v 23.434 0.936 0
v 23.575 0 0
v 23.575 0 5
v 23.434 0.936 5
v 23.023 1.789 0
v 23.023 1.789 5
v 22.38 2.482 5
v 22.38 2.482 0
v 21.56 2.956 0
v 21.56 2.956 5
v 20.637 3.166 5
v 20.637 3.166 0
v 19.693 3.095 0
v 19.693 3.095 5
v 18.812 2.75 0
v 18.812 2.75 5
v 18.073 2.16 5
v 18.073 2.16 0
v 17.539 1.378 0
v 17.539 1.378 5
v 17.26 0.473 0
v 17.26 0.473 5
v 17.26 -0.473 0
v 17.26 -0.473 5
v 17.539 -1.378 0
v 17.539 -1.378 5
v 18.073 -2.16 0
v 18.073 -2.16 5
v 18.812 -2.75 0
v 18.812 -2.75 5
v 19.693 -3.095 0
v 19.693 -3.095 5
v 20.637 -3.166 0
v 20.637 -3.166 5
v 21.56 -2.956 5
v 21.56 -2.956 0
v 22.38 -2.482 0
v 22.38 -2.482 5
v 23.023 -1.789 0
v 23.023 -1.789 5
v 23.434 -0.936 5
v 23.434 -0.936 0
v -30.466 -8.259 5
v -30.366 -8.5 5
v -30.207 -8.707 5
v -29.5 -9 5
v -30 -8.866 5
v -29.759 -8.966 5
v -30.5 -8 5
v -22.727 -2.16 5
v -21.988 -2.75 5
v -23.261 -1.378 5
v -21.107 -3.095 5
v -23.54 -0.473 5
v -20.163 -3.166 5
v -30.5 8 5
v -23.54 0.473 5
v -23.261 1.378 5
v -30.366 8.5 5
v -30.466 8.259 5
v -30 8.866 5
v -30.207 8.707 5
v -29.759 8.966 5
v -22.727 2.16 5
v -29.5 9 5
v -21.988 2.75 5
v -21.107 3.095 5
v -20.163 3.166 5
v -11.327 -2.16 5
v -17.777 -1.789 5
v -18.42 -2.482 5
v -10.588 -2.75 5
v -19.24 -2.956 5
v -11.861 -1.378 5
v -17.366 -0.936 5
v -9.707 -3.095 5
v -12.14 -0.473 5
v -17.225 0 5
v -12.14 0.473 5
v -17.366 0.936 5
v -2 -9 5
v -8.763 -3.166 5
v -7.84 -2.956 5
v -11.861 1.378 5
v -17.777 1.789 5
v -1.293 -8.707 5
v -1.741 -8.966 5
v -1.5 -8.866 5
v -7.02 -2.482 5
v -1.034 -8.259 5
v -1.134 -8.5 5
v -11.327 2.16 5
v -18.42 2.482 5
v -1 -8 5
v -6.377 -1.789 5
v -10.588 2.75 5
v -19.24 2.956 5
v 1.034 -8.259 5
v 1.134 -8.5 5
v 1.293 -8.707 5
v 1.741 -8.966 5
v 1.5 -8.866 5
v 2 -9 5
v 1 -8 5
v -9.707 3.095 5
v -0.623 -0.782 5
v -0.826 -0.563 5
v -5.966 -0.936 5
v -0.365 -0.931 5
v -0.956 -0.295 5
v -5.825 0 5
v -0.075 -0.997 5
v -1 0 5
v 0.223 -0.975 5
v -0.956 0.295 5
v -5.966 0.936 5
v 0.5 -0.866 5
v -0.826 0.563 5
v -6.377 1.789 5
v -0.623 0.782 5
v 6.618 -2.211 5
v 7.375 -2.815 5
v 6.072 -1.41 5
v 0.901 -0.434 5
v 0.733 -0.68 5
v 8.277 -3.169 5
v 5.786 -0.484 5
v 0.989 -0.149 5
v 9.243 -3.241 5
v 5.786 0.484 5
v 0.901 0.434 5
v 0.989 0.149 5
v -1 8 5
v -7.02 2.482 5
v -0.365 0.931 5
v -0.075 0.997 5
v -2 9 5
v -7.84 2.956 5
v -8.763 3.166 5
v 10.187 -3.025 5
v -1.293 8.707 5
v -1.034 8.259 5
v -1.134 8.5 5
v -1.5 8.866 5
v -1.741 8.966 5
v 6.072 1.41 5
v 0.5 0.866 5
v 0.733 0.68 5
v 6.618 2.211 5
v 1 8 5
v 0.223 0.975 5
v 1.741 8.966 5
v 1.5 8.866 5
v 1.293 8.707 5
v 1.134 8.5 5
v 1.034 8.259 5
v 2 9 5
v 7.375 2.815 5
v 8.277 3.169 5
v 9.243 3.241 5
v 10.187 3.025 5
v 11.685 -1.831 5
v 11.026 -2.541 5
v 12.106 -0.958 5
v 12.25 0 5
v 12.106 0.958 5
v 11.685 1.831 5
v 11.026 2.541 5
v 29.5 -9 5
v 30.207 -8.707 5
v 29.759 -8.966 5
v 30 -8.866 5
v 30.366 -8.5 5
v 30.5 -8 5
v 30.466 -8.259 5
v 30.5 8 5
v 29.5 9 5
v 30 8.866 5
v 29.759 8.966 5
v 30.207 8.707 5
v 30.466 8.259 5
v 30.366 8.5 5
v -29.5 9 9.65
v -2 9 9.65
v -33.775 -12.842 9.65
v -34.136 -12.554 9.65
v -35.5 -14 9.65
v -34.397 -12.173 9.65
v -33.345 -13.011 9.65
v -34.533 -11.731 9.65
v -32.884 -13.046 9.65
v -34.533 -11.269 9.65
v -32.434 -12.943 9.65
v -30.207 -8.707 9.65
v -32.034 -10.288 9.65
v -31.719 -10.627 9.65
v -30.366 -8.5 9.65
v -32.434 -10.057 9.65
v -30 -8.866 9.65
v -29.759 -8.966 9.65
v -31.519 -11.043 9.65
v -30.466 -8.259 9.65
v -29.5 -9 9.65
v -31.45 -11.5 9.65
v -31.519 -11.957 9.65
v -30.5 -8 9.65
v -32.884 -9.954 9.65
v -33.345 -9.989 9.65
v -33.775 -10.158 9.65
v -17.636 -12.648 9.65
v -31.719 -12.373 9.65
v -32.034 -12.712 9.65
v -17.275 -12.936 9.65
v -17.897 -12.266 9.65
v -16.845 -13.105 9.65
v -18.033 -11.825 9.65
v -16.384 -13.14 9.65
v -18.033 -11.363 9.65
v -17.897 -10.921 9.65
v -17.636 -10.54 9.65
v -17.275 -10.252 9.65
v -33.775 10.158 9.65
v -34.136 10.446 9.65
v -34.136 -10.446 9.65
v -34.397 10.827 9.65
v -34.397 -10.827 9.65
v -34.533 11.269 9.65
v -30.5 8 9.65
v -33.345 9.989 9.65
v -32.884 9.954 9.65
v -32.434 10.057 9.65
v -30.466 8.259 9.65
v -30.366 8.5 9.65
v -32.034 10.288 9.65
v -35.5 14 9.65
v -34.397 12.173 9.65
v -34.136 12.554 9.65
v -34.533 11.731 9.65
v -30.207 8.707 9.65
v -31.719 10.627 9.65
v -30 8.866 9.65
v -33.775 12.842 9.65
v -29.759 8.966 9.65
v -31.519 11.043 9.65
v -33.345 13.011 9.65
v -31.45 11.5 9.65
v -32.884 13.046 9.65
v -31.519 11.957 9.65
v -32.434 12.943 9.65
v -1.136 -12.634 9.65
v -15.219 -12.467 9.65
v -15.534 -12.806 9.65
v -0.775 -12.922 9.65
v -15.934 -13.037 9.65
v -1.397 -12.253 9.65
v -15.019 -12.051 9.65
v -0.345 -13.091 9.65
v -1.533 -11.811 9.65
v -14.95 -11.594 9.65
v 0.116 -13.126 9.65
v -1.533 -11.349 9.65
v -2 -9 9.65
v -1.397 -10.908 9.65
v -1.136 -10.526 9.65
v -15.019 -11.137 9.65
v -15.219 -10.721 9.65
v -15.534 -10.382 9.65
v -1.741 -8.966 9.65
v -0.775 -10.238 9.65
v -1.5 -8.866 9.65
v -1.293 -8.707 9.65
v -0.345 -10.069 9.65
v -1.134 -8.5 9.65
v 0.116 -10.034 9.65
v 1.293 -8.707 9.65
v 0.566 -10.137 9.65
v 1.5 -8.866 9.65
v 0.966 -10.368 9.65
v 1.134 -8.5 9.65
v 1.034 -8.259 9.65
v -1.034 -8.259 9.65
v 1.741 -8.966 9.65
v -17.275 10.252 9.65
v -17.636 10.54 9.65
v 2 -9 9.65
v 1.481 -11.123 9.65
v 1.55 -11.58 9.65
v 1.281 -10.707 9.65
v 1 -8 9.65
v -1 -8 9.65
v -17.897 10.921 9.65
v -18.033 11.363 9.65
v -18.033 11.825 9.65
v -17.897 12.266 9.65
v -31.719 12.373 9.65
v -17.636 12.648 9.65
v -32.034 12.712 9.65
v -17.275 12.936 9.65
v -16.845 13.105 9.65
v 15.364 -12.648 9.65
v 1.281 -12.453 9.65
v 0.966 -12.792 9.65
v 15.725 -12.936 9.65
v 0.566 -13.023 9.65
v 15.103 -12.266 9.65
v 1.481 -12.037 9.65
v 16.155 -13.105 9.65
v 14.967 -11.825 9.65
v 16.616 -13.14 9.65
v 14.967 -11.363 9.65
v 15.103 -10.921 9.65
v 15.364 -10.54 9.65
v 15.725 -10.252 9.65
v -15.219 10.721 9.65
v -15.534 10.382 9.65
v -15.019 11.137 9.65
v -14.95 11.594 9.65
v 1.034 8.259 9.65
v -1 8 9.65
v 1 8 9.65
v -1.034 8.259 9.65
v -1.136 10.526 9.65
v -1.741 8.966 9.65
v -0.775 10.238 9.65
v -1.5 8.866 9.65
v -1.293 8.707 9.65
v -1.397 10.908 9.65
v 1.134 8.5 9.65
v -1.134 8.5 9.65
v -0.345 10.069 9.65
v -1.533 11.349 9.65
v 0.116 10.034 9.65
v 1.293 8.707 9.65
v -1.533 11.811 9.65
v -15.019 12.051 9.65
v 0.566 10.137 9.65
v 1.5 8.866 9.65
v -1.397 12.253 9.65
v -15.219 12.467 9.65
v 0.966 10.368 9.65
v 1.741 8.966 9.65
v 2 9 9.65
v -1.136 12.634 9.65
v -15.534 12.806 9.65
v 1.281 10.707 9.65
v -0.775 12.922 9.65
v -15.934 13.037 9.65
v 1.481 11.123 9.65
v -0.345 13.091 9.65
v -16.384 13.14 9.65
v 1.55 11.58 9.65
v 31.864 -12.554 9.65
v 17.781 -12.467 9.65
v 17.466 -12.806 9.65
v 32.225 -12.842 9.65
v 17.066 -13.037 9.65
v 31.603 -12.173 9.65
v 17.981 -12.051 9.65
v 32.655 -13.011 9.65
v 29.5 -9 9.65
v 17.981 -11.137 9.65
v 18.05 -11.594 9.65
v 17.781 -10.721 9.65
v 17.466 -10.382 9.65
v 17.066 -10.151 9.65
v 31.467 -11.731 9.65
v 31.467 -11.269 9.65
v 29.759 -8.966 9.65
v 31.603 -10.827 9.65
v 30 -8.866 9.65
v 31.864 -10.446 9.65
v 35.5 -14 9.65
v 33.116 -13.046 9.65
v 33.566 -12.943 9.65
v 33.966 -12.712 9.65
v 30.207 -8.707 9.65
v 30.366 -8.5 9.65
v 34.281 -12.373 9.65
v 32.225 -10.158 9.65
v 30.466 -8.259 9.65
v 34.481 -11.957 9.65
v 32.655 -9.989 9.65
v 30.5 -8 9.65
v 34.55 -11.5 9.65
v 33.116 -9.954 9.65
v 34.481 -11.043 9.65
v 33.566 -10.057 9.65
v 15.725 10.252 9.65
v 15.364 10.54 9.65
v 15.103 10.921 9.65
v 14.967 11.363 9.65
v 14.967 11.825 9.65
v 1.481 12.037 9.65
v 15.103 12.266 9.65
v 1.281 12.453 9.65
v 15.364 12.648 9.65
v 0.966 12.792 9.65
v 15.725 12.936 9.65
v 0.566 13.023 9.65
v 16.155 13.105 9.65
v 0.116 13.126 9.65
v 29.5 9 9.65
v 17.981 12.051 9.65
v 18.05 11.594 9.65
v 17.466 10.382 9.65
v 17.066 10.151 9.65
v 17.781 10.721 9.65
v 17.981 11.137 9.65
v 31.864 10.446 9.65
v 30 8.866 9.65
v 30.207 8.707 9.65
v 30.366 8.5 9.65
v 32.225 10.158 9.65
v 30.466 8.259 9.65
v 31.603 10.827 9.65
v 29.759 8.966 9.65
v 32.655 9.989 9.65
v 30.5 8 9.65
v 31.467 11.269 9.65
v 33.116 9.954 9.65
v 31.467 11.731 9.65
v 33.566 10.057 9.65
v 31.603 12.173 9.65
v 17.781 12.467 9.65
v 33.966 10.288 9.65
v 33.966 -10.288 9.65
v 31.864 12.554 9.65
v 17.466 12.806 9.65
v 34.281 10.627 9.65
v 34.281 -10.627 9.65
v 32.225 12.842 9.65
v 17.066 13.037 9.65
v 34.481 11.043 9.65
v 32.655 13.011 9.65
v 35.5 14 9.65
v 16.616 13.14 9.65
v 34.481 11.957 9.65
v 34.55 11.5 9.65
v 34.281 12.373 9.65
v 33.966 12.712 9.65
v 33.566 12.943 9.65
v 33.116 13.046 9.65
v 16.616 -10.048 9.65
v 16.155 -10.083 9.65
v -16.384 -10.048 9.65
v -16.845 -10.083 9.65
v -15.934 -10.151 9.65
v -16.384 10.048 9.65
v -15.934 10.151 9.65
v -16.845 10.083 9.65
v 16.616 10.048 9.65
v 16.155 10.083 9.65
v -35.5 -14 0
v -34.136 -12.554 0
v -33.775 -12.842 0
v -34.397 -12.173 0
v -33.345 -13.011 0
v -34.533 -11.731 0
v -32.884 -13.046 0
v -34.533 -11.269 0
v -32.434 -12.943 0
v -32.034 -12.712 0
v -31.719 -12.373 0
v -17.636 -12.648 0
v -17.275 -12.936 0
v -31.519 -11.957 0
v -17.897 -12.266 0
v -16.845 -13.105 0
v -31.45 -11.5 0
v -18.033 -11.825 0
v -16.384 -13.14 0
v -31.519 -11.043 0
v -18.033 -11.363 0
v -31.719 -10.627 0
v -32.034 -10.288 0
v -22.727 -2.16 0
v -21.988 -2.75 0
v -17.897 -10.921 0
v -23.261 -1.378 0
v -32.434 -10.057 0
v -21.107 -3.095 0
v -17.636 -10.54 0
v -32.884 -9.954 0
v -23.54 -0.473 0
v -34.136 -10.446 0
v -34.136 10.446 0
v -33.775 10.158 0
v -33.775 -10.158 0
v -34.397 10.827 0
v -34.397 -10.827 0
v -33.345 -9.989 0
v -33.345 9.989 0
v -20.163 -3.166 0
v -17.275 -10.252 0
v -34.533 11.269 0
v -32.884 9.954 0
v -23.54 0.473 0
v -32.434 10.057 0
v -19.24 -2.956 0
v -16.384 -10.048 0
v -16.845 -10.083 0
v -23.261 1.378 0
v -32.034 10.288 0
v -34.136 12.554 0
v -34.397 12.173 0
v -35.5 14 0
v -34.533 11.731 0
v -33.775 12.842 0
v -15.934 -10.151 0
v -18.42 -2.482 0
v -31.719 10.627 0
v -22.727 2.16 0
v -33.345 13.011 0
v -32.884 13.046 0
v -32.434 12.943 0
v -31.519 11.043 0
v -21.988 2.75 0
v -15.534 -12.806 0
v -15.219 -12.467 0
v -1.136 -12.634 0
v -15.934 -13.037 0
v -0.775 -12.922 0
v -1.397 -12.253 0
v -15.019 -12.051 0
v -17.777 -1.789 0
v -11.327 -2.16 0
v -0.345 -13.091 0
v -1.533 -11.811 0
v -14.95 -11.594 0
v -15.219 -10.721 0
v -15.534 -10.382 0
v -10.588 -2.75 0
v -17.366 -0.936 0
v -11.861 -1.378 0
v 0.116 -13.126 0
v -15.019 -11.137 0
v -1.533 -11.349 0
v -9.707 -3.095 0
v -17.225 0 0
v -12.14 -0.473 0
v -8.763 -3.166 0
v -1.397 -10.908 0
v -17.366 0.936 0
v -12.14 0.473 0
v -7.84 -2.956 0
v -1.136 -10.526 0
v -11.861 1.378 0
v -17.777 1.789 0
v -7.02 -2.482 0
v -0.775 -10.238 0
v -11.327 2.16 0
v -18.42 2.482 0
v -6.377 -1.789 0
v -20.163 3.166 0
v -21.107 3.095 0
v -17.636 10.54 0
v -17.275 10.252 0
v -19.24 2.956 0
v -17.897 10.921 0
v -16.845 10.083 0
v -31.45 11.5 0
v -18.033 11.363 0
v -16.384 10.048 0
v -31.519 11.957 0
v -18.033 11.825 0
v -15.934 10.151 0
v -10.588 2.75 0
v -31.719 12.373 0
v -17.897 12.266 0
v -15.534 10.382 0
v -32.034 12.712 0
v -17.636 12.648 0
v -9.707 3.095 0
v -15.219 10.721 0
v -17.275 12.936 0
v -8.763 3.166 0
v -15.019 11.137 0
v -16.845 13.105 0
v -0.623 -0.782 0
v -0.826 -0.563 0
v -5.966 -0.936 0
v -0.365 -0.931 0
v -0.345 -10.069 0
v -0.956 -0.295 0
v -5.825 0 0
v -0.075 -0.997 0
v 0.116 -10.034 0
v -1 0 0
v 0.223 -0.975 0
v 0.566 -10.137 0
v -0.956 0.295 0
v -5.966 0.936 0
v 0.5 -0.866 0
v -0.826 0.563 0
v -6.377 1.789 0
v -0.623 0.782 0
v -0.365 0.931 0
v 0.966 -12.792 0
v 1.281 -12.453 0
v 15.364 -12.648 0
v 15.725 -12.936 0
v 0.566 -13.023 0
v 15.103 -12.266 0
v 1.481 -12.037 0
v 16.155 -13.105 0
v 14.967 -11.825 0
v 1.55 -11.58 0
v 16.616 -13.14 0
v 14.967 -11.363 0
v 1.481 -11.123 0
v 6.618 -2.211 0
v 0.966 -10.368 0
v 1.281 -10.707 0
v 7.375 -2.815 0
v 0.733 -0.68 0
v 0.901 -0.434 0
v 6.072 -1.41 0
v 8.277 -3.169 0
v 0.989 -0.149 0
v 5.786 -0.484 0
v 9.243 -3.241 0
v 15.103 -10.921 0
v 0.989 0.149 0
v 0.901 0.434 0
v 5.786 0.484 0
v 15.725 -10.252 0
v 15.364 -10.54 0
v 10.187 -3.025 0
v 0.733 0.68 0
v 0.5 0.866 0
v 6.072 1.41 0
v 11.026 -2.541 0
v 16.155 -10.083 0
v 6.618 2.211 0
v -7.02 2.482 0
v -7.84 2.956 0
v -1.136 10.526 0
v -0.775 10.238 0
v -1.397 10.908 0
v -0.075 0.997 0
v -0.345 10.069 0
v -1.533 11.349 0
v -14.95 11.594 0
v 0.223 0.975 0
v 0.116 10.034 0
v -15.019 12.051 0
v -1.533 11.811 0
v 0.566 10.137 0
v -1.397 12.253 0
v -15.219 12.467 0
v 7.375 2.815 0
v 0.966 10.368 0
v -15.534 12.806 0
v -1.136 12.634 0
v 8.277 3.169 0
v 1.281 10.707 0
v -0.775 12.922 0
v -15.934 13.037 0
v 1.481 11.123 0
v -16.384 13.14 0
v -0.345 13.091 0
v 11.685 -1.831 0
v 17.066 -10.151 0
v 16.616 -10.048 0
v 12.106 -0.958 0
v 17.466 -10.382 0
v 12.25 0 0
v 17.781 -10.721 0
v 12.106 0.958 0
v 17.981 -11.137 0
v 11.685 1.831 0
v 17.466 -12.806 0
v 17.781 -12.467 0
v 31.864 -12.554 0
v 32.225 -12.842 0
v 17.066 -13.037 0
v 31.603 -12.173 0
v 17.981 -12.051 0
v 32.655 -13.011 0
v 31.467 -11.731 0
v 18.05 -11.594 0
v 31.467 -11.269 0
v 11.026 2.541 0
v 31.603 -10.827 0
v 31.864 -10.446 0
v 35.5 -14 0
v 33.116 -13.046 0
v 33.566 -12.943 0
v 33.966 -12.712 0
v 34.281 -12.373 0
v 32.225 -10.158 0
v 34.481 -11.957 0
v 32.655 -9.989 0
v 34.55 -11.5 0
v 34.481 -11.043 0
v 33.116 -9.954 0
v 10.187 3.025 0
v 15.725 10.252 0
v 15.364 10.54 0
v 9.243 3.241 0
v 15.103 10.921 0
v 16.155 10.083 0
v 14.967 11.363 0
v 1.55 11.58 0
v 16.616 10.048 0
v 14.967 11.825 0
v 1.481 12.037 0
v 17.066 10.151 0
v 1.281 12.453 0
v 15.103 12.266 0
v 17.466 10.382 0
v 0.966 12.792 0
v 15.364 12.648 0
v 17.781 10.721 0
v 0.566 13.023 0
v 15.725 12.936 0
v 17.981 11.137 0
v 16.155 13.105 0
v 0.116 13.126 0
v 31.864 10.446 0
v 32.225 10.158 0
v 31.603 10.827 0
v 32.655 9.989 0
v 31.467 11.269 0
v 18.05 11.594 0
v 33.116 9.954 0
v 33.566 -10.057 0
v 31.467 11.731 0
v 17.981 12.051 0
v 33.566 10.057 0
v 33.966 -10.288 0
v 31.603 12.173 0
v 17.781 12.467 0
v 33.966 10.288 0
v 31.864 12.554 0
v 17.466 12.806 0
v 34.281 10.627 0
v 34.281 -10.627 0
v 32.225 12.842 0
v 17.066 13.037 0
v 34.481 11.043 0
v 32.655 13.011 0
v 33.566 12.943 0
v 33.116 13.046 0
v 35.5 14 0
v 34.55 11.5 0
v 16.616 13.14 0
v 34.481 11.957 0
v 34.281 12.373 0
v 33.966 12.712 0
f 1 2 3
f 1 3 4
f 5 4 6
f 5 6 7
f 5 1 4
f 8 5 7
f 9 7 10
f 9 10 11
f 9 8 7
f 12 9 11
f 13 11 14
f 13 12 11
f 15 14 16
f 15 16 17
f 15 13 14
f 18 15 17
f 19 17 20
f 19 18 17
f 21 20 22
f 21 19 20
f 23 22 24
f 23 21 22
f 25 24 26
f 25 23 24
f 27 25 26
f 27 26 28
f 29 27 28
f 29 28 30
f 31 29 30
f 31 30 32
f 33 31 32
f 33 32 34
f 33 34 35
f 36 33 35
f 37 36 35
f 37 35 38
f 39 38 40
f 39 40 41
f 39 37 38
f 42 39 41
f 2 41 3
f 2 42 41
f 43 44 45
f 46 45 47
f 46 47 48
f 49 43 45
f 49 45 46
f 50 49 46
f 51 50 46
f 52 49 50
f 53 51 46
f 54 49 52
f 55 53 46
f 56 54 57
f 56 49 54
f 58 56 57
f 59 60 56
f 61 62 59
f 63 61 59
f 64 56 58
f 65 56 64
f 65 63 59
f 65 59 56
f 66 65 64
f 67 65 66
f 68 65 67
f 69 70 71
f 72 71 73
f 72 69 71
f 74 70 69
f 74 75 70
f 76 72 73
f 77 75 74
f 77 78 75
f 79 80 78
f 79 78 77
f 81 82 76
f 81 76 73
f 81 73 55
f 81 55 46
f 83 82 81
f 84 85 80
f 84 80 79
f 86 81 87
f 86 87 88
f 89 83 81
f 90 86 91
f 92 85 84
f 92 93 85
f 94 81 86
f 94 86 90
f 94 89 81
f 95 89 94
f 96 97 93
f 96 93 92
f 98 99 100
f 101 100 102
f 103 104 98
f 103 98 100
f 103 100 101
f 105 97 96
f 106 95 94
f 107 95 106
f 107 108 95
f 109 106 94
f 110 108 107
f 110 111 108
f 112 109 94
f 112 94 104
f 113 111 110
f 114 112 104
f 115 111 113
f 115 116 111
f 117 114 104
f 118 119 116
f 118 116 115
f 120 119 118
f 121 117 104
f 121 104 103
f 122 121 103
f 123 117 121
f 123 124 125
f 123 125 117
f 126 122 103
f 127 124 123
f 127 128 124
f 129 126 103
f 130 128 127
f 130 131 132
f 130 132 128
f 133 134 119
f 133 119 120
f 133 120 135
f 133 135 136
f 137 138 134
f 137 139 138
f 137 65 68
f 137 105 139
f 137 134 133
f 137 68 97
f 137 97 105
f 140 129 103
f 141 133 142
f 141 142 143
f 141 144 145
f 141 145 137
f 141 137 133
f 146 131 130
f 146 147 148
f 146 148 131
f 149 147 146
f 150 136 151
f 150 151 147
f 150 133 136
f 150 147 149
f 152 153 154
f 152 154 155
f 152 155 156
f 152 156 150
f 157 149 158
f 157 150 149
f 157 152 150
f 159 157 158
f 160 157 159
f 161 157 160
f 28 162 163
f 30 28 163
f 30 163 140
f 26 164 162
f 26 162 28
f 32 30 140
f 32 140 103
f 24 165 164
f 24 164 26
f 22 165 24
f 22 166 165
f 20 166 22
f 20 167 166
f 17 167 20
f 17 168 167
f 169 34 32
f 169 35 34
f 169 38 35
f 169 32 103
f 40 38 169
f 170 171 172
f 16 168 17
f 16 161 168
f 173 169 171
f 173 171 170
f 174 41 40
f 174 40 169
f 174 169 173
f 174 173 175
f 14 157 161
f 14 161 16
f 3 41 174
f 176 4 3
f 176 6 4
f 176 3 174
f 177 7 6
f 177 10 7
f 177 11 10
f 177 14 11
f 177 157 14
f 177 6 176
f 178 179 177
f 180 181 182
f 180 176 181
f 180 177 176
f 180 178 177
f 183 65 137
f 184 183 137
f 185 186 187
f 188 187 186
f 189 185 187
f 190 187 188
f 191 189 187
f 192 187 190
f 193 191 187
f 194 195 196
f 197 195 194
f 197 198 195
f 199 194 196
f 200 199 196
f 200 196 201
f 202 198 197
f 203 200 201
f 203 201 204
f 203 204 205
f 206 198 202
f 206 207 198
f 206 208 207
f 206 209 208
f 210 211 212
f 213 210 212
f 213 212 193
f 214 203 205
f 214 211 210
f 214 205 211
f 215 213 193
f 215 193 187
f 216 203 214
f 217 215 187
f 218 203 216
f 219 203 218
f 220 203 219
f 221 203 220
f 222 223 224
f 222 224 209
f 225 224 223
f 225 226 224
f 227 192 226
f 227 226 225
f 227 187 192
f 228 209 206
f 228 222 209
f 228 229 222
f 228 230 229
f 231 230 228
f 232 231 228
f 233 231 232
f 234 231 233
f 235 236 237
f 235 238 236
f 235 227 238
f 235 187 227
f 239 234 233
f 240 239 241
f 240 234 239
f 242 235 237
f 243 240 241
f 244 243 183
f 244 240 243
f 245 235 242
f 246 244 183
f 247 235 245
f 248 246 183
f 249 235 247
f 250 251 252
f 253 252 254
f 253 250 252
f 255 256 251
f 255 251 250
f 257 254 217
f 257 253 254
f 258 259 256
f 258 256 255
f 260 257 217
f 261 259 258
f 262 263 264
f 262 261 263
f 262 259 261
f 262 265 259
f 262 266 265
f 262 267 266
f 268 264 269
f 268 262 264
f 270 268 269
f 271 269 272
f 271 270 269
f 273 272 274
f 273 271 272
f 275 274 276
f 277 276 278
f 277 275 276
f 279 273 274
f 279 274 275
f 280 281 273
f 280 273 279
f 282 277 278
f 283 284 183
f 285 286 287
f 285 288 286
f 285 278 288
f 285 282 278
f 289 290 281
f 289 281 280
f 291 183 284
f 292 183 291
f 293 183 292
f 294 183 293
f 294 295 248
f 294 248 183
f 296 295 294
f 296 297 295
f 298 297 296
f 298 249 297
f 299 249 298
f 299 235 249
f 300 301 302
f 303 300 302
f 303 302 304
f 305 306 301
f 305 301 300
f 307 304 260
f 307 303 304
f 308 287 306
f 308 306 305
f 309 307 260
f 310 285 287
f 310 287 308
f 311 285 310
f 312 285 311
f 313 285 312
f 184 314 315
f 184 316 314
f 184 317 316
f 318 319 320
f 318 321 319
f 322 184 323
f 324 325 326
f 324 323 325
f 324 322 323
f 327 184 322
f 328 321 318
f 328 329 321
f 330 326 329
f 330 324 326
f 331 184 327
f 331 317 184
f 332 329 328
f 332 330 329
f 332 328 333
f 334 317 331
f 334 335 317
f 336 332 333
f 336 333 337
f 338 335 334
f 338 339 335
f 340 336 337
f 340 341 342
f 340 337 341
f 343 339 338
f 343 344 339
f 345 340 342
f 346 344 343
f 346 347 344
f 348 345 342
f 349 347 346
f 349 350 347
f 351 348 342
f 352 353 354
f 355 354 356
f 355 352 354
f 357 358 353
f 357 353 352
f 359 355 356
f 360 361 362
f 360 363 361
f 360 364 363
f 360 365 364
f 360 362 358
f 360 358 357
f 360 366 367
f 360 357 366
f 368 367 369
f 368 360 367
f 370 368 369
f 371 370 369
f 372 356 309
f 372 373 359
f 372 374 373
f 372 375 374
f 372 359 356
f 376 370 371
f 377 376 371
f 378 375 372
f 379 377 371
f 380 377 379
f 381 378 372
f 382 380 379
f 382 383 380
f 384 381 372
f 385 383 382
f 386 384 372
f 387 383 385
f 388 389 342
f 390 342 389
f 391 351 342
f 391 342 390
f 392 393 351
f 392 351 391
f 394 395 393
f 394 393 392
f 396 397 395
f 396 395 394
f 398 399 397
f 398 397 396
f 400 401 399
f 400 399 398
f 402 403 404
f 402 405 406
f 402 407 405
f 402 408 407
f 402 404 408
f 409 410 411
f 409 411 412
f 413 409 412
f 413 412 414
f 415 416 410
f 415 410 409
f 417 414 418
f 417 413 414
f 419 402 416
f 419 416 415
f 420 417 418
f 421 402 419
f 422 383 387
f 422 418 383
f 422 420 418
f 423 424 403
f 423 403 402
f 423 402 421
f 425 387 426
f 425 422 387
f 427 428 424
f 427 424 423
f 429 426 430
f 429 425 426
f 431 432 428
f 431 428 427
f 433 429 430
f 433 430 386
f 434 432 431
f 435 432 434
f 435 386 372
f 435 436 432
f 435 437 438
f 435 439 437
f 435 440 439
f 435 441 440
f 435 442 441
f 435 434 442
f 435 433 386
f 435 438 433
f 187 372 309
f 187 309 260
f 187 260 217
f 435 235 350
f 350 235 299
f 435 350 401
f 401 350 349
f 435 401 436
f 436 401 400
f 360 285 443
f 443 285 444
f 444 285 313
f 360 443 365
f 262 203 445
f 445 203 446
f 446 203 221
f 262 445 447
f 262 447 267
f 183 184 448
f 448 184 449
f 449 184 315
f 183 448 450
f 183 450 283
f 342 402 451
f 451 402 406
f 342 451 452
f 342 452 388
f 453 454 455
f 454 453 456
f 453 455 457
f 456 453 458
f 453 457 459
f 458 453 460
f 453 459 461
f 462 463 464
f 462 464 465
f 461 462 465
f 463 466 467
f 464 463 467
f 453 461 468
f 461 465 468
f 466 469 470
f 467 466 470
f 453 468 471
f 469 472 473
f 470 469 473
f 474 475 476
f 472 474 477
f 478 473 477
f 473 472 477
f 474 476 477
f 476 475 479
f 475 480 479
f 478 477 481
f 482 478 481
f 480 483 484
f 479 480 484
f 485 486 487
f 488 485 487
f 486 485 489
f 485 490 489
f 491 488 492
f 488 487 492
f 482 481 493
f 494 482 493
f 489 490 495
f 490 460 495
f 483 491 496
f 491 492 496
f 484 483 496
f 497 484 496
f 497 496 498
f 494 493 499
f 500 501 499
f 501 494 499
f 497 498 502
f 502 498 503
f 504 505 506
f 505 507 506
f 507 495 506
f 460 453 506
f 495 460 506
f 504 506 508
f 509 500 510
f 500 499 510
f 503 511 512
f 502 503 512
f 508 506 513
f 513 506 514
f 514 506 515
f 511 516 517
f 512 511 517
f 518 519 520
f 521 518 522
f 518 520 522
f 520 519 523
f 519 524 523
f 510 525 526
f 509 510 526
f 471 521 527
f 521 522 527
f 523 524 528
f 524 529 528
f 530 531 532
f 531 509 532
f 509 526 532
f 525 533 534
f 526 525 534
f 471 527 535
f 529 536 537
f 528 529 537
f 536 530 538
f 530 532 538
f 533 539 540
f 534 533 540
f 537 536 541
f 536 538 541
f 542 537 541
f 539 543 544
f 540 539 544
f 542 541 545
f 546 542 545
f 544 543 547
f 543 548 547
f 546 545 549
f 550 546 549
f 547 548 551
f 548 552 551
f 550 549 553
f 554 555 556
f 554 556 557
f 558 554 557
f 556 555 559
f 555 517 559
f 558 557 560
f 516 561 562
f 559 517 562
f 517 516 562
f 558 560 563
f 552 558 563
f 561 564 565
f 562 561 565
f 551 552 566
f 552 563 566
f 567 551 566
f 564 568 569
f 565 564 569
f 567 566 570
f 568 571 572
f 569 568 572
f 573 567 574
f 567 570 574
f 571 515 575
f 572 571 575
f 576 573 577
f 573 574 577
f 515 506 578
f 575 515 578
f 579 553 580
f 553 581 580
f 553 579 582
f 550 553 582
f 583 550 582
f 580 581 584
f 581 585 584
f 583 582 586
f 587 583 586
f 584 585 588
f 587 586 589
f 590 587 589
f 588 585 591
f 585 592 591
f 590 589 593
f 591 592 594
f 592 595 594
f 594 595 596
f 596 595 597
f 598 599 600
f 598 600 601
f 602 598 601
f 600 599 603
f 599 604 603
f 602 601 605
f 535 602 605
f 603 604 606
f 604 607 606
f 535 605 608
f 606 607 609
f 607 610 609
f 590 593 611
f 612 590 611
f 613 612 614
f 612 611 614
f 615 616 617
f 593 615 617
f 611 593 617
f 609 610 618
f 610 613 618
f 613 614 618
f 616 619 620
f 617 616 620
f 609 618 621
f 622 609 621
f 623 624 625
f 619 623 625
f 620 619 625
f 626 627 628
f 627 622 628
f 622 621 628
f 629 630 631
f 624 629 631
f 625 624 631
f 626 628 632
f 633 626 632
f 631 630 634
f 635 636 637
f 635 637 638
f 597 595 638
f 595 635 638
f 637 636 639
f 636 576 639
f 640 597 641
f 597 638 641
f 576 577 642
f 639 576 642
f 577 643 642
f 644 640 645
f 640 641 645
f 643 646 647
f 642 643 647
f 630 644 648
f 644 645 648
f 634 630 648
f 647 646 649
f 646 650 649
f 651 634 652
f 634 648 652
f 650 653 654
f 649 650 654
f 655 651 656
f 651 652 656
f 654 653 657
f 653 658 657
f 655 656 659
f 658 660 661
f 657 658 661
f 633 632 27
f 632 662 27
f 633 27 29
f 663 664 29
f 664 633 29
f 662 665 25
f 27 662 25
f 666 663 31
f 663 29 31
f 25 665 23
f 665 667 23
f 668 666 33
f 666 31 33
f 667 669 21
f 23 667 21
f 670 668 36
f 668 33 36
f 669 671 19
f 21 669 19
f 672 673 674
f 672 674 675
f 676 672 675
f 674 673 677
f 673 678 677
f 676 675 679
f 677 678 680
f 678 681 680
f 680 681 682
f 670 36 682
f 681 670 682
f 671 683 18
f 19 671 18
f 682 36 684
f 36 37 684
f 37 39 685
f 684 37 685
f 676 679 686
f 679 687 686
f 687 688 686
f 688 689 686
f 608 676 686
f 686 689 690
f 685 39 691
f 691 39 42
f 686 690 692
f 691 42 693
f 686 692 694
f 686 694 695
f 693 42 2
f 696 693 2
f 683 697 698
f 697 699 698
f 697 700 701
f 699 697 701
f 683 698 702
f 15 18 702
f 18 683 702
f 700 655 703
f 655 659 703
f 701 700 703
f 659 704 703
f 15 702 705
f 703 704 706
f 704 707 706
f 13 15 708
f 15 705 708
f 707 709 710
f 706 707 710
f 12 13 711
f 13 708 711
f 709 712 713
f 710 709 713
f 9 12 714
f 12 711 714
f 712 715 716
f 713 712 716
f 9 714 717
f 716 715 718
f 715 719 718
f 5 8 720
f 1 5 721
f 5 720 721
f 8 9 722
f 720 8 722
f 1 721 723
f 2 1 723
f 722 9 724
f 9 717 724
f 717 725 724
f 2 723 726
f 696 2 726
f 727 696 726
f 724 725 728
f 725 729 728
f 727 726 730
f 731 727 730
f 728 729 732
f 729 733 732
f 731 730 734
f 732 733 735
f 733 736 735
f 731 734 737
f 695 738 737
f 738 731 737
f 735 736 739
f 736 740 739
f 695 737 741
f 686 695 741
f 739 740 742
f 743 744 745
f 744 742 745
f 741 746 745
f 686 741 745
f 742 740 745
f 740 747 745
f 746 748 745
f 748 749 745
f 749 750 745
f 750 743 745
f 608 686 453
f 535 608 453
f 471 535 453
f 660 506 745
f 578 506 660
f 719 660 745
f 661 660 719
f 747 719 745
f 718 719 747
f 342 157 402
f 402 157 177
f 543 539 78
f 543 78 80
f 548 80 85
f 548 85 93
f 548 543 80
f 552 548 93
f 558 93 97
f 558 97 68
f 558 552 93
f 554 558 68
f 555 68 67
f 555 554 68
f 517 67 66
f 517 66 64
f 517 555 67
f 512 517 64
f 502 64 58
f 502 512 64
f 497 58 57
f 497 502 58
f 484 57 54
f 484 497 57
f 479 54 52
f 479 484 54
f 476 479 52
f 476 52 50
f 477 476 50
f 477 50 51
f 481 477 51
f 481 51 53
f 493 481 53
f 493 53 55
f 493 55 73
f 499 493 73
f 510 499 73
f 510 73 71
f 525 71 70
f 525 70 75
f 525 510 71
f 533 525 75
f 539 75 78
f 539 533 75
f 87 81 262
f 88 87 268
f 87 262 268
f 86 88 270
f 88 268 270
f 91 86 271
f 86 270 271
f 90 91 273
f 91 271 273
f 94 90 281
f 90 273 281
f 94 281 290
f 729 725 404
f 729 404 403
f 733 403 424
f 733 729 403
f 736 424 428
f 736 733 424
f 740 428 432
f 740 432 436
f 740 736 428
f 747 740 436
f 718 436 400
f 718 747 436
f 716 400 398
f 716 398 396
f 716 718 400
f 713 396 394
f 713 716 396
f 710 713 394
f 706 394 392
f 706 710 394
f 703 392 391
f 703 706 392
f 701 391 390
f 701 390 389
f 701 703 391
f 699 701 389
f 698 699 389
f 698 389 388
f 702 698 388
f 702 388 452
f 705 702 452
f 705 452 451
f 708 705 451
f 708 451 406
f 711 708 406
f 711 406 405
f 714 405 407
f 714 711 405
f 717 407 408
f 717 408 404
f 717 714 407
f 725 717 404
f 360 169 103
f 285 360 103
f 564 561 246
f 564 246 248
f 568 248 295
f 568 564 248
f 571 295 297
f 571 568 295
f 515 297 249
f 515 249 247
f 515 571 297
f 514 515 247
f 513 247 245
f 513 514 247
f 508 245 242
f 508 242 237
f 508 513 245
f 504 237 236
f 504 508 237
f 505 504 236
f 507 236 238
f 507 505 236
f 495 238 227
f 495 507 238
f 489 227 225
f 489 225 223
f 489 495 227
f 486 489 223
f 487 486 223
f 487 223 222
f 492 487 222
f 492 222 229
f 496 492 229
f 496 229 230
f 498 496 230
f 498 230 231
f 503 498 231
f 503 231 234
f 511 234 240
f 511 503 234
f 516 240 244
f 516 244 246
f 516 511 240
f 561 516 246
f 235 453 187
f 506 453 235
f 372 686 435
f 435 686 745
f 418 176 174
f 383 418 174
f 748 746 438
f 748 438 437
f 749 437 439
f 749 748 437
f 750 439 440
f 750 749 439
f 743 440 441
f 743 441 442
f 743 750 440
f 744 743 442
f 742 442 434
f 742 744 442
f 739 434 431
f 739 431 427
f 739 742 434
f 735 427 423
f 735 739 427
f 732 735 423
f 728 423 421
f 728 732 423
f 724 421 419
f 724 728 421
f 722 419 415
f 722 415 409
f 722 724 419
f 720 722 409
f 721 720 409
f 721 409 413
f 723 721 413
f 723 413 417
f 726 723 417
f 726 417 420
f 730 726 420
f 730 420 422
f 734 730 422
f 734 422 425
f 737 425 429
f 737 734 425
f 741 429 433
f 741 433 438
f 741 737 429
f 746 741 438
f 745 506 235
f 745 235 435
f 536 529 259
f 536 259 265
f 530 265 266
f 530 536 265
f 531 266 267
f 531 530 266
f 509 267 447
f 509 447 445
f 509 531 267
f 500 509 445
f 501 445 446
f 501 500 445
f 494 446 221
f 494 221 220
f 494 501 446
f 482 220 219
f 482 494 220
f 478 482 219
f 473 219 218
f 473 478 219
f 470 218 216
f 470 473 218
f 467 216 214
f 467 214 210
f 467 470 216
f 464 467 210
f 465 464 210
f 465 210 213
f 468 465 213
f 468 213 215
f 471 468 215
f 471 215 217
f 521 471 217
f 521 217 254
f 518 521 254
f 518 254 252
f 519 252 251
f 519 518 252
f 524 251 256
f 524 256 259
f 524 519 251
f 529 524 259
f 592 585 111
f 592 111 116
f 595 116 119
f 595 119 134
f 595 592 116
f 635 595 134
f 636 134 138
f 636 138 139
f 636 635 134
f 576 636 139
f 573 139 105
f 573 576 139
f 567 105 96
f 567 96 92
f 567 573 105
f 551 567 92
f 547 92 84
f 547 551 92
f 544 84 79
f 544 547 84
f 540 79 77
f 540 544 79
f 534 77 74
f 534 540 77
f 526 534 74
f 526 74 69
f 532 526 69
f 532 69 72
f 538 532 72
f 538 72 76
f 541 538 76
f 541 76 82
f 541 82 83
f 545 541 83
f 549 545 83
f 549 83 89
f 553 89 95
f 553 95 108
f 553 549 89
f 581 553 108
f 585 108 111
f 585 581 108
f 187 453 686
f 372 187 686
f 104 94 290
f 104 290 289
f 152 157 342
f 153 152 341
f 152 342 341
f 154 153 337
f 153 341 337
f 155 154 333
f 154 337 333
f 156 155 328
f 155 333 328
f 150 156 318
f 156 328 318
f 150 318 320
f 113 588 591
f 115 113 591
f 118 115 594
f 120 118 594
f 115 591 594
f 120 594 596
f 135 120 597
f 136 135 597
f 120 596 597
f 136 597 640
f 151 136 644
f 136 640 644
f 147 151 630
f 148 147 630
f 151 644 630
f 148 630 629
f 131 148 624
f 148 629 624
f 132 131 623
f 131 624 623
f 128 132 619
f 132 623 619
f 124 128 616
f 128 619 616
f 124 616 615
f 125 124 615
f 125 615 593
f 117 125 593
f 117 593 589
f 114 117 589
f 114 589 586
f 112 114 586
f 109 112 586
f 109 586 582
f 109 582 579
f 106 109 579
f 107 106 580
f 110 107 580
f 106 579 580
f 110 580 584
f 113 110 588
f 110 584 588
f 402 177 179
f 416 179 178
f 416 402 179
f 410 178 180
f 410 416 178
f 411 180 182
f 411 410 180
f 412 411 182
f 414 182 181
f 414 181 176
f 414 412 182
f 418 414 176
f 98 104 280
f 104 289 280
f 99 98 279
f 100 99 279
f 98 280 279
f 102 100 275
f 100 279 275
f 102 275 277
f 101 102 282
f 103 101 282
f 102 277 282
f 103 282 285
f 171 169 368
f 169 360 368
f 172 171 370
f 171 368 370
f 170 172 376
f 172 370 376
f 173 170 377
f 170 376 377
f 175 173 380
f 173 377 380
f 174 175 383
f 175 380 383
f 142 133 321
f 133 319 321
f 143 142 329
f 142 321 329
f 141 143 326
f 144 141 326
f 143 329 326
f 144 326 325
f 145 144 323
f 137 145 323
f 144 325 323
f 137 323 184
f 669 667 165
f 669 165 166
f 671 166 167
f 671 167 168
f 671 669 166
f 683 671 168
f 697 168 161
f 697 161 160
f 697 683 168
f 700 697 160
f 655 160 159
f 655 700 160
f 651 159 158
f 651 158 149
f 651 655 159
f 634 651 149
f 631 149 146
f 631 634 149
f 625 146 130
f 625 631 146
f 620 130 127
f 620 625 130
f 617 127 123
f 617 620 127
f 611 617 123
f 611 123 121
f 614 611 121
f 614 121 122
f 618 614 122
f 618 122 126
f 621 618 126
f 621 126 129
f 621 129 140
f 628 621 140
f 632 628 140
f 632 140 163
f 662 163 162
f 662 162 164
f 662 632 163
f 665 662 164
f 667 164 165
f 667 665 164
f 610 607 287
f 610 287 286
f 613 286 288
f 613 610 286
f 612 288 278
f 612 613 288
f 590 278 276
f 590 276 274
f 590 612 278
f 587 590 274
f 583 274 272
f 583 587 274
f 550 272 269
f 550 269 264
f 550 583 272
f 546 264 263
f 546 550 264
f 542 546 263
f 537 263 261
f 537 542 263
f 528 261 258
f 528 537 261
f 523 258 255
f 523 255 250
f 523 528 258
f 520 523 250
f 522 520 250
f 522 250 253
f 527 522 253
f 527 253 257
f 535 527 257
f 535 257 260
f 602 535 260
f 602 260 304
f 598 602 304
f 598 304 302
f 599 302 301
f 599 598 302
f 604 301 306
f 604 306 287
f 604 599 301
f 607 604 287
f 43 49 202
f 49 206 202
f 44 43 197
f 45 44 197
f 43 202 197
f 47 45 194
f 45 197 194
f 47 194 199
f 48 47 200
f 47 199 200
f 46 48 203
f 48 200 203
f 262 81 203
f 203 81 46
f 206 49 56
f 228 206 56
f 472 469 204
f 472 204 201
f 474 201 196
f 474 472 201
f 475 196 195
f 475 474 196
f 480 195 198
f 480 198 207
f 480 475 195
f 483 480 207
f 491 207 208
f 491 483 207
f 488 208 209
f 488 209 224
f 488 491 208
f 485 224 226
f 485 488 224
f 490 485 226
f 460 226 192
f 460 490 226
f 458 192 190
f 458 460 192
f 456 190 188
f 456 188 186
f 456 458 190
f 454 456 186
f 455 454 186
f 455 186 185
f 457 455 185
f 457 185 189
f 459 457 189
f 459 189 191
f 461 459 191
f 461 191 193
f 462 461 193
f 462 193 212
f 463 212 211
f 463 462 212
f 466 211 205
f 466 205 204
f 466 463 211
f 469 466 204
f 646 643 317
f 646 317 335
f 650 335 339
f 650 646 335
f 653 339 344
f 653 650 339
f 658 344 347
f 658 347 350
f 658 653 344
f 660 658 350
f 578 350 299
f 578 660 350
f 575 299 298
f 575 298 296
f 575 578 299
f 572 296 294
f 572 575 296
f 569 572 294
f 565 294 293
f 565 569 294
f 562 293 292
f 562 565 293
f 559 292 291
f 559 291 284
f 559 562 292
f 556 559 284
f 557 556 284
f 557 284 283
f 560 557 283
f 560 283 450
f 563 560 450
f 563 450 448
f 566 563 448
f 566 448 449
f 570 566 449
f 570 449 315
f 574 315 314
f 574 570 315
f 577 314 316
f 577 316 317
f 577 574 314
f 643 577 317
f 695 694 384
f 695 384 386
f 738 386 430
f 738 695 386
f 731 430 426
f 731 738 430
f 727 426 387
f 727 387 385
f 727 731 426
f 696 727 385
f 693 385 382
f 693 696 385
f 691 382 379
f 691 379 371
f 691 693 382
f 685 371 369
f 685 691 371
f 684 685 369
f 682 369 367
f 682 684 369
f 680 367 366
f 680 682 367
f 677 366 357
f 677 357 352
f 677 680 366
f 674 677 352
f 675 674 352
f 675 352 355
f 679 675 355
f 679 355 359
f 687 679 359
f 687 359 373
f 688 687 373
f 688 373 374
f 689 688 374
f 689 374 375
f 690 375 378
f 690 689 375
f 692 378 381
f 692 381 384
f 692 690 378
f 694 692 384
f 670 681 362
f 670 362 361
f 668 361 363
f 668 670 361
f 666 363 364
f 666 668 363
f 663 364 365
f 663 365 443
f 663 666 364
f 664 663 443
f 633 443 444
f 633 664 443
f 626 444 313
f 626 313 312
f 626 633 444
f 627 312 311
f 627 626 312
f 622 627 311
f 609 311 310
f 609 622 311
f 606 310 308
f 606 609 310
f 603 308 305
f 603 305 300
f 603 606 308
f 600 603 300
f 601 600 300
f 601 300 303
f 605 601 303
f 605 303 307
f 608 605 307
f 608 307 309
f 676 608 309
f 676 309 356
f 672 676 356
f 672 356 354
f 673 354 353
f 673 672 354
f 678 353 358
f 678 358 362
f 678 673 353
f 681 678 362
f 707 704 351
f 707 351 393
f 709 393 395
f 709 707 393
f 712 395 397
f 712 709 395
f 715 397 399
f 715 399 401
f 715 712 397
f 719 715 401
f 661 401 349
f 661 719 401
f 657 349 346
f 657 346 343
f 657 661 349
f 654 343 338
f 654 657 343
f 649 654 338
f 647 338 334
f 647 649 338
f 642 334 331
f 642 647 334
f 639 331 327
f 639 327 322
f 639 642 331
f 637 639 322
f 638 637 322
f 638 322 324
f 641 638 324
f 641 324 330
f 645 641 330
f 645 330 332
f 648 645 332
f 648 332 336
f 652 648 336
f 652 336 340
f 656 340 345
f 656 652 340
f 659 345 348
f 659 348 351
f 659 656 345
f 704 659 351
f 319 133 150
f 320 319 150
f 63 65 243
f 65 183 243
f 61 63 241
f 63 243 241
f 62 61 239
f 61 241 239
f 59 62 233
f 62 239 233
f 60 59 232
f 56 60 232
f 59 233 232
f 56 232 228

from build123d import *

# Parameters (mm, degrees)
F0_W     = 71
F0_H     = 28
F0_R     = 1.55
F0_W_2   = 2
F0_H_2   = 1
F1_DEPTH = 9.65
F0_R_2   = 3.25
F0_R_3   = 3.175
F2_DEPTH = 5
F3_R     = 0.99999


# Not quite as in the source:
# - a fillet or chamfer is up to 0.001 mm smaller than in the source, because OpenCascade refuses the exact size


with BuildPart() as f1:
    # F0 (on Top) → F1 (new body)
    with BuildSketch(Plane.XY):
        Rectangle(F0_W, F0_H)
        with Locations((-33, -11.5)):
            Circle(F0_R, mode=Mode.SUBTRACT)
        with Locations((-16.5, -11.5939453244)):
            Circle(F0_R, mode=Mode.SUBTRACT)
        with Locations((0, -11.5801189095)):
            Circle(F0_R, mode=Mode.SUBTRACT)
        with Locations((16.5, -11.5939453244)):
            Circle(F0_R, mode=Mode.SUBTRACT)
        with Locations((33, -11.5)):
            Circle(F0_R, mode=Mode.SUBTRACT)
        with Locations((-33, 11.5)):
            Circle(F0_R, mode=Mode.SUBTRACT)
        with Locations((-16.5, 11.5939453244)):
            Circle(F0_R, mode=Mode.SUBTRACT)
        Polygon((-30.5, -9), (-30.5, 9), (-1, 9), (1, 9), (30.5, 9), (30.5, -9), (1, -9), (-1, -9), align=None, mode=Mode.SUBTRACT)
        with Locations((0, 11.5801189095)):
            Circle(F0_R, mode=Mode.SUBTRACT)
        with Locations((16.5, 11.5939453244)):
            Circle(F0_R, mode=Mode.SUBTRACT)
        with Locations((33, 11.5)):
            Circle(F0_R, mode=Mode.SUBTRACT)
        with Locations((0, -8.5)):
            Rectangle(F0_W_2, F0_H_2)
        with Locations((0, 8.5)):
            Rectangle(F0_W_2, F0_H_2)
    extrude(amount=F1_DEPTH)

    # F0 (on Top) → F2 (join)
    with BuildSketch(Plane.XY):
        Polygon((30.5, 9), (1, 9), (1, 8), (1, 0), (1, -8), (1, -9), (30.5, -9), align=None)
        with Locations((9, 0)):
            Circle(F0_R_2, mode=Mode.SUBTRACT)
        with Locations((20.4, 0)):
            Circle(F0_R_3, mode=Mode.SUBTRACT)
        Polygon((-1, 9), (-30.5, 9), (-30.5, -9), (-1, -9), (-1, -8), (-1, -6.4e-09), (-1, 8), align=None)
        with Locations((-20.4, 0)):
            Circle(F0_R_3, mode=Mode.SUBTRACT)
        with Locations((-9, 0)):
            Circle(F0_R_3, mode=Mode.SUBTRACT)
        with BuildLine():
            ThreePointArc((1, 0), (3.2e-09, -1), (-1, -6.4e-09))
            Line((-1, -6.4e-09), (-1, -8))
            Line((-1, -8), (1, -8))
            Line((1, -8), (1, 0))
        make_face()
        with BuildLine():
            Line((1, 8), (-1, 8))
            Line((-1, 8), (-1, -6.4e-09))
            ThreePointArc((-1, -6.4e-09), (-3.2e-09, 1), (1, 0))
            Line((1, 0), (1, 8))
        make_face()
    extrude(amount=F2_DEPTH)

    # F3 (radius 1 in the source; OpenCascade refuses exactly that, so slightly less here)
    f3_edges = [f1.edges().sort_by_distance(p)[0] for p in [
        (-30.5, -9, 7.325),
        (-1, -9, 7.325),
        (-30.5, 9, 7.325),
        (-1, 9, 7.325),
        (1, 9, 7.325),
        (1, -9, 7.325),
        (30.5, -9, 7.325),
        (30.5, 9, 7.325),
    ]]
    fillet(f3_edges, radius=F3_R)


solid = f1.part
